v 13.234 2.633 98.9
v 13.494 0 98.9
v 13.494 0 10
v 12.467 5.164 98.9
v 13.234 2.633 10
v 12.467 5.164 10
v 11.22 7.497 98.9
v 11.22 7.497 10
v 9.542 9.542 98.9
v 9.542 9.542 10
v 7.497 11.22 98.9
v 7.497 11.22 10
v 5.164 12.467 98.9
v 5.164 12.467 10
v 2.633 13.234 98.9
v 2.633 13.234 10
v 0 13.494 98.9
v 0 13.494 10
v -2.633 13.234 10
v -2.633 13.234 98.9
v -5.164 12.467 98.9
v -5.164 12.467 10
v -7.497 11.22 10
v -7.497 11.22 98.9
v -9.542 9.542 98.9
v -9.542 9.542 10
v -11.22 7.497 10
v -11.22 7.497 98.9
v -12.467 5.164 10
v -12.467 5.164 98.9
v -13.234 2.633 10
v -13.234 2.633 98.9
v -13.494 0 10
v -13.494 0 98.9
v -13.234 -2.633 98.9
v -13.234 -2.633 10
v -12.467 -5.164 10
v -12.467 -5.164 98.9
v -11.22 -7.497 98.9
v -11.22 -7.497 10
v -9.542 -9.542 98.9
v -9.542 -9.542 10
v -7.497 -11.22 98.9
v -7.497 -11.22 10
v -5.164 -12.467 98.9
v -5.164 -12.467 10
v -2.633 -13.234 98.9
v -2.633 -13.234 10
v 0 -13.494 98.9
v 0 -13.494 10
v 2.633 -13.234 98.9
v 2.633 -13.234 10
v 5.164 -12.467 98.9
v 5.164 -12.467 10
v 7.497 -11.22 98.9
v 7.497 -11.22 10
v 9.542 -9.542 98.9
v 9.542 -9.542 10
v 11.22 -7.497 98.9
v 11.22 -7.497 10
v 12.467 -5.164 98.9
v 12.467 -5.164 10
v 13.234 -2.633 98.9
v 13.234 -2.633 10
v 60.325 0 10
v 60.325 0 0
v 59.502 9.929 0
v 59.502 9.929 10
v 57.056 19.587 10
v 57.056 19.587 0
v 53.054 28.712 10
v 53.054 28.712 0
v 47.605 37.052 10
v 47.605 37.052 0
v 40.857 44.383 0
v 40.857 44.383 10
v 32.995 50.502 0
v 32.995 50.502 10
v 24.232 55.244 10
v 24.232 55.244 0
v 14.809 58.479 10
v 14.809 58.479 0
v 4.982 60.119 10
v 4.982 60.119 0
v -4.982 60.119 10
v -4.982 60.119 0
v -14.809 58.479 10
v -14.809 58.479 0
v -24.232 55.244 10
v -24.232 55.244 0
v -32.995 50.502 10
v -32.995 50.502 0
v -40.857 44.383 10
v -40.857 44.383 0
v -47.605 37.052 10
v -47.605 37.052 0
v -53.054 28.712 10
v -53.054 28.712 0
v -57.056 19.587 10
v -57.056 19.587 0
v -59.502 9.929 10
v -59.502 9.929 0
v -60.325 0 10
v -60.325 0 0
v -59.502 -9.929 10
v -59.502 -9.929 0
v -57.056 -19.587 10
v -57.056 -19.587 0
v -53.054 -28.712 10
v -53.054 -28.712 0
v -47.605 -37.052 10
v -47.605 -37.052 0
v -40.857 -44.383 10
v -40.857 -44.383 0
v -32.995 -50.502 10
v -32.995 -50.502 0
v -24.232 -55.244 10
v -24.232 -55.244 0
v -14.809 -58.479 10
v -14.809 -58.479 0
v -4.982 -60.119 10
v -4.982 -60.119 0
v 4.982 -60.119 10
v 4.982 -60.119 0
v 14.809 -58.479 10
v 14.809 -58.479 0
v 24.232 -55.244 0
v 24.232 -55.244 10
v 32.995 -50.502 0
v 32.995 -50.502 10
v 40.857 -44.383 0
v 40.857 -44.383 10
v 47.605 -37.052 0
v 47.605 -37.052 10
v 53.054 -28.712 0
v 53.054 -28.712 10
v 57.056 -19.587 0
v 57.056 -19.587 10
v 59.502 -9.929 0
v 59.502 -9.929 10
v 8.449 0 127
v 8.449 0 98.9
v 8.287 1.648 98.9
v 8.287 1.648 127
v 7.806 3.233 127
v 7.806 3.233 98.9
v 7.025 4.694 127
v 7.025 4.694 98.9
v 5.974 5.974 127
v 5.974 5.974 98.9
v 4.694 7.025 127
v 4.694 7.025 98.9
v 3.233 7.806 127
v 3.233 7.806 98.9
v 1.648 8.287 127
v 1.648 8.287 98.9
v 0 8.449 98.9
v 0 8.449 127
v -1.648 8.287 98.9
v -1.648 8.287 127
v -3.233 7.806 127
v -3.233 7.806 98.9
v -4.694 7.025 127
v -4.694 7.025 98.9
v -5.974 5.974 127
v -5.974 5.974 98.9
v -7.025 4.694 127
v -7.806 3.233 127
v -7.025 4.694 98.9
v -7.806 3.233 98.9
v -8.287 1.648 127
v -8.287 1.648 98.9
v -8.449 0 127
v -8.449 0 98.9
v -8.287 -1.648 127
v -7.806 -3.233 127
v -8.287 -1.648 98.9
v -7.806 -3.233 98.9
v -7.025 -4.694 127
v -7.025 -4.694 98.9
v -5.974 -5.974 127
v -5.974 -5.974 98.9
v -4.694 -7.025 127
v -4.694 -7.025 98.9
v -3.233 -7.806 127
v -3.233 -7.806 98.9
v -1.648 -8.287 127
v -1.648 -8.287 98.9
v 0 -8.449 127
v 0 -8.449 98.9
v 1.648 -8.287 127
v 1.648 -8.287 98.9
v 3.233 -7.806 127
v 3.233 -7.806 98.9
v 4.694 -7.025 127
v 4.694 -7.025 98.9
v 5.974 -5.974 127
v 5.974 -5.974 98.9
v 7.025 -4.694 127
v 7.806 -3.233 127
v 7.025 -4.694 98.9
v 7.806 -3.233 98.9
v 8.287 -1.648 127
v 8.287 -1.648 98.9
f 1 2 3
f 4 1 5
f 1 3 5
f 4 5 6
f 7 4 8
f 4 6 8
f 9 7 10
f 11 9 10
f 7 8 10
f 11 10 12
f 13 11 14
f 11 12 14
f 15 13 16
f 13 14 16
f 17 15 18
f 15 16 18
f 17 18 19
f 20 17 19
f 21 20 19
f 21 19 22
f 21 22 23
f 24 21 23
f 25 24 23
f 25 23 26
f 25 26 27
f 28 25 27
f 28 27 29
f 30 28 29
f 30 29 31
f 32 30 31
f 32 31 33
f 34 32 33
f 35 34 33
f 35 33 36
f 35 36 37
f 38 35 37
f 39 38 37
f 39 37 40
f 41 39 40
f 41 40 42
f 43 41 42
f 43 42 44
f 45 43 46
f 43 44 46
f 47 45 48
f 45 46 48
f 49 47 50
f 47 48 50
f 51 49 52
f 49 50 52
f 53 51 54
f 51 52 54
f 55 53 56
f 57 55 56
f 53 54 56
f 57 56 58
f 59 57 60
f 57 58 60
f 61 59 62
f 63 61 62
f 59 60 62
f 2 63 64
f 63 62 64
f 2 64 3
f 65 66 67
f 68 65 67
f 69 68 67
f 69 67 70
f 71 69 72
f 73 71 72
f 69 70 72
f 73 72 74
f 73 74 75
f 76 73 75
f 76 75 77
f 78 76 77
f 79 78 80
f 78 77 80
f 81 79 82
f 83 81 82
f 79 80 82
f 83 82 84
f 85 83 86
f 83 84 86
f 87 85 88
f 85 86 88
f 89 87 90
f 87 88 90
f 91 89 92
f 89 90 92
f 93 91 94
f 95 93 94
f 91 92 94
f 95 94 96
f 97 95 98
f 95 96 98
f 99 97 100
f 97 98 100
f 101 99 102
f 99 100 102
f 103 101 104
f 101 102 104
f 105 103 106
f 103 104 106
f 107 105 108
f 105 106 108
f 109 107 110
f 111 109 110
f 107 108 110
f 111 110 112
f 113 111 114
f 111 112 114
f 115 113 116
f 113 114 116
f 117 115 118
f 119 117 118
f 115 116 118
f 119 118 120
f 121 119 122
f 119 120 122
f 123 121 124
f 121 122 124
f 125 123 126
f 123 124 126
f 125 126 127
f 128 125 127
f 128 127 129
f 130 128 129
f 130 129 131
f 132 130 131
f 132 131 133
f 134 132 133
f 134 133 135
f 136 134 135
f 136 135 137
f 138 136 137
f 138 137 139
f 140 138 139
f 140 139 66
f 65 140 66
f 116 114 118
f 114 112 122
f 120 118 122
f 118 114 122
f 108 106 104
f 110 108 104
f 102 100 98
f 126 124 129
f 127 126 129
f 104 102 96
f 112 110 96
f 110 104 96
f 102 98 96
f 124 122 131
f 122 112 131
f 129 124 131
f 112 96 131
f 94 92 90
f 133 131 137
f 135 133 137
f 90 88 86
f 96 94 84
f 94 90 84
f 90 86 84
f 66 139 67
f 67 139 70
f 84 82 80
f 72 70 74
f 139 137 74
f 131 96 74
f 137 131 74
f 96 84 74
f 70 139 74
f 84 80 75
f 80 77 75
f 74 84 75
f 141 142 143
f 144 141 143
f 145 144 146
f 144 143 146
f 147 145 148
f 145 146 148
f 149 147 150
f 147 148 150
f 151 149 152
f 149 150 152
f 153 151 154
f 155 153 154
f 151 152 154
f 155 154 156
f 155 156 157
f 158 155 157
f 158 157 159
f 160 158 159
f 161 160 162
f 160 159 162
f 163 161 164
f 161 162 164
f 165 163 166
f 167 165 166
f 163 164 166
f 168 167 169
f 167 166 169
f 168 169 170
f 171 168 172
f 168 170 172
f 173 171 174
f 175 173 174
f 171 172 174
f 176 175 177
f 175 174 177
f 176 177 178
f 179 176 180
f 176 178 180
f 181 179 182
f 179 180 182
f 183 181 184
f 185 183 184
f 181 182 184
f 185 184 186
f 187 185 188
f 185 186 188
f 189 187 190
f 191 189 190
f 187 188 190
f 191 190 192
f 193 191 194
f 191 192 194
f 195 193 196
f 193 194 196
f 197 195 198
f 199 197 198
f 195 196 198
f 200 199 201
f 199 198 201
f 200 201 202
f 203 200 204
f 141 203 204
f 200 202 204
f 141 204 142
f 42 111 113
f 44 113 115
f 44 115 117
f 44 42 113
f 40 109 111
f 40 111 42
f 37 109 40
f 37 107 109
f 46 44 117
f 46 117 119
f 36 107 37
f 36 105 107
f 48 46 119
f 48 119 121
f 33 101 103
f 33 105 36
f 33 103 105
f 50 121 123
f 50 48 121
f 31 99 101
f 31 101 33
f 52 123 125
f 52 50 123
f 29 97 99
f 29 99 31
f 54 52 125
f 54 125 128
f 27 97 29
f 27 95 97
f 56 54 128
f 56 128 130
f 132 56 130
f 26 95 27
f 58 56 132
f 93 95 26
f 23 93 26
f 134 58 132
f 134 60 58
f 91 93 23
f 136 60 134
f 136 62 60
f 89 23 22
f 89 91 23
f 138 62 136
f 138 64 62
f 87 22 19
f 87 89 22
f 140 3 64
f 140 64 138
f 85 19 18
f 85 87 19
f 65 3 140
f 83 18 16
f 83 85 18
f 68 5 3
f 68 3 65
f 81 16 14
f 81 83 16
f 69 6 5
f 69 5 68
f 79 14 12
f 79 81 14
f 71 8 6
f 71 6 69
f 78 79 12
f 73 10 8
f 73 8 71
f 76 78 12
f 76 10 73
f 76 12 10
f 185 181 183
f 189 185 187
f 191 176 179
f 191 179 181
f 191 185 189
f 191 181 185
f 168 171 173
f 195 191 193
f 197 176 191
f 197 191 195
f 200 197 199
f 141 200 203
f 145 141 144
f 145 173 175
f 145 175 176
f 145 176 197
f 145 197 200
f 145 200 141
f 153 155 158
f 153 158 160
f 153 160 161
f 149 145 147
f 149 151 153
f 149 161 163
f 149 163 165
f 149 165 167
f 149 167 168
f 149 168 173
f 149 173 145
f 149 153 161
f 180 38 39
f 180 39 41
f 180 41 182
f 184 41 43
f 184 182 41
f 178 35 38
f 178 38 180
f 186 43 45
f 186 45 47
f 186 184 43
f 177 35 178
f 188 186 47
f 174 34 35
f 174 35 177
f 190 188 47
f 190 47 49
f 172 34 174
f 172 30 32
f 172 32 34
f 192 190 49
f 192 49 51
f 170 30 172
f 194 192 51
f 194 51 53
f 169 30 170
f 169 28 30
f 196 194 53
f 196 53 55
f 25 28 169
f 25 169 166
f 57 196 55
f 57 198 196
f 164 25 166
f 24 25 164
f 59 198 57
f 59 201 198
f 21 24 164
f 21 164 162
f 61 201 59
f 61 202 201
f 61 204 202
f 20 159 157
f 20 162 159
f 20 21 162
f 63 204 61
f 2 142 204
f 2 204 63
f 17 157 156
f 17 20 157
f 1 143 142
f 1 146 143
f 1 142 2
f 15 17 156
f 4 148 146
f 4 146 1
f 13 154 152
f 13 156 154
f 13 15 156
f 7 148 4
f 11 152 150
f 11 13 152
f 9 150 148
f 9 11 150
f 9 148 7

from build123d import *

# Parameters (mm, degrees)
SKETCH1_R           = 60.325
BOSS_EXTRUDE1_DEPTH = 10
SKETCH2_R           = 13.49375
BOSS_EXTRUDE2_DEPTH = 117
CUT_EXTRUDE1_START  = -28.1
SKETCH3_R           = 13.49375
CUT_EXTRUDE1_DEPTH  = 28.1
SKETCH4_R           = 8.449063039
BOSS_EXTRUDE3_DEPTH = 28.1


with BuildPart() as part:
    # Sketch1 → Boss-Extrude1 (new body)
    with BuildSketch(Plane.XY):
        Circle(SKETCH1_R)
    extrude(amount=BOSS_EXTRUDE1_DEPTH)

    # Sketch2 → Boss-Extrude2 (add)
    with BuildSketch(Plane.XY.offset(10)):
        Circle(SKETCH2_R)
    extrude(amount=BOSS_EXTRUDE2_DEPTH)

    # Sketch3 → Cut-Extrude1 (cut)
    with BuildSketch(Plane.XY.offset(127).offset(CUT_EXTRUDE1_START)):
        Circle(SKETCH3_R)
    extrude(amount=CUT_EXTRUDE1_DEPTH, mode=Mode.SUBTRACT)

    # Sketch4 → Boss-Extrude3 (add)
    with BuildSketch(Plane.XY.offset(98.9)):
        Circle(SKETCH4_R)
    extrude(amount=BOSS_EXTRUDE3_DEPTH)


solid = part.part
